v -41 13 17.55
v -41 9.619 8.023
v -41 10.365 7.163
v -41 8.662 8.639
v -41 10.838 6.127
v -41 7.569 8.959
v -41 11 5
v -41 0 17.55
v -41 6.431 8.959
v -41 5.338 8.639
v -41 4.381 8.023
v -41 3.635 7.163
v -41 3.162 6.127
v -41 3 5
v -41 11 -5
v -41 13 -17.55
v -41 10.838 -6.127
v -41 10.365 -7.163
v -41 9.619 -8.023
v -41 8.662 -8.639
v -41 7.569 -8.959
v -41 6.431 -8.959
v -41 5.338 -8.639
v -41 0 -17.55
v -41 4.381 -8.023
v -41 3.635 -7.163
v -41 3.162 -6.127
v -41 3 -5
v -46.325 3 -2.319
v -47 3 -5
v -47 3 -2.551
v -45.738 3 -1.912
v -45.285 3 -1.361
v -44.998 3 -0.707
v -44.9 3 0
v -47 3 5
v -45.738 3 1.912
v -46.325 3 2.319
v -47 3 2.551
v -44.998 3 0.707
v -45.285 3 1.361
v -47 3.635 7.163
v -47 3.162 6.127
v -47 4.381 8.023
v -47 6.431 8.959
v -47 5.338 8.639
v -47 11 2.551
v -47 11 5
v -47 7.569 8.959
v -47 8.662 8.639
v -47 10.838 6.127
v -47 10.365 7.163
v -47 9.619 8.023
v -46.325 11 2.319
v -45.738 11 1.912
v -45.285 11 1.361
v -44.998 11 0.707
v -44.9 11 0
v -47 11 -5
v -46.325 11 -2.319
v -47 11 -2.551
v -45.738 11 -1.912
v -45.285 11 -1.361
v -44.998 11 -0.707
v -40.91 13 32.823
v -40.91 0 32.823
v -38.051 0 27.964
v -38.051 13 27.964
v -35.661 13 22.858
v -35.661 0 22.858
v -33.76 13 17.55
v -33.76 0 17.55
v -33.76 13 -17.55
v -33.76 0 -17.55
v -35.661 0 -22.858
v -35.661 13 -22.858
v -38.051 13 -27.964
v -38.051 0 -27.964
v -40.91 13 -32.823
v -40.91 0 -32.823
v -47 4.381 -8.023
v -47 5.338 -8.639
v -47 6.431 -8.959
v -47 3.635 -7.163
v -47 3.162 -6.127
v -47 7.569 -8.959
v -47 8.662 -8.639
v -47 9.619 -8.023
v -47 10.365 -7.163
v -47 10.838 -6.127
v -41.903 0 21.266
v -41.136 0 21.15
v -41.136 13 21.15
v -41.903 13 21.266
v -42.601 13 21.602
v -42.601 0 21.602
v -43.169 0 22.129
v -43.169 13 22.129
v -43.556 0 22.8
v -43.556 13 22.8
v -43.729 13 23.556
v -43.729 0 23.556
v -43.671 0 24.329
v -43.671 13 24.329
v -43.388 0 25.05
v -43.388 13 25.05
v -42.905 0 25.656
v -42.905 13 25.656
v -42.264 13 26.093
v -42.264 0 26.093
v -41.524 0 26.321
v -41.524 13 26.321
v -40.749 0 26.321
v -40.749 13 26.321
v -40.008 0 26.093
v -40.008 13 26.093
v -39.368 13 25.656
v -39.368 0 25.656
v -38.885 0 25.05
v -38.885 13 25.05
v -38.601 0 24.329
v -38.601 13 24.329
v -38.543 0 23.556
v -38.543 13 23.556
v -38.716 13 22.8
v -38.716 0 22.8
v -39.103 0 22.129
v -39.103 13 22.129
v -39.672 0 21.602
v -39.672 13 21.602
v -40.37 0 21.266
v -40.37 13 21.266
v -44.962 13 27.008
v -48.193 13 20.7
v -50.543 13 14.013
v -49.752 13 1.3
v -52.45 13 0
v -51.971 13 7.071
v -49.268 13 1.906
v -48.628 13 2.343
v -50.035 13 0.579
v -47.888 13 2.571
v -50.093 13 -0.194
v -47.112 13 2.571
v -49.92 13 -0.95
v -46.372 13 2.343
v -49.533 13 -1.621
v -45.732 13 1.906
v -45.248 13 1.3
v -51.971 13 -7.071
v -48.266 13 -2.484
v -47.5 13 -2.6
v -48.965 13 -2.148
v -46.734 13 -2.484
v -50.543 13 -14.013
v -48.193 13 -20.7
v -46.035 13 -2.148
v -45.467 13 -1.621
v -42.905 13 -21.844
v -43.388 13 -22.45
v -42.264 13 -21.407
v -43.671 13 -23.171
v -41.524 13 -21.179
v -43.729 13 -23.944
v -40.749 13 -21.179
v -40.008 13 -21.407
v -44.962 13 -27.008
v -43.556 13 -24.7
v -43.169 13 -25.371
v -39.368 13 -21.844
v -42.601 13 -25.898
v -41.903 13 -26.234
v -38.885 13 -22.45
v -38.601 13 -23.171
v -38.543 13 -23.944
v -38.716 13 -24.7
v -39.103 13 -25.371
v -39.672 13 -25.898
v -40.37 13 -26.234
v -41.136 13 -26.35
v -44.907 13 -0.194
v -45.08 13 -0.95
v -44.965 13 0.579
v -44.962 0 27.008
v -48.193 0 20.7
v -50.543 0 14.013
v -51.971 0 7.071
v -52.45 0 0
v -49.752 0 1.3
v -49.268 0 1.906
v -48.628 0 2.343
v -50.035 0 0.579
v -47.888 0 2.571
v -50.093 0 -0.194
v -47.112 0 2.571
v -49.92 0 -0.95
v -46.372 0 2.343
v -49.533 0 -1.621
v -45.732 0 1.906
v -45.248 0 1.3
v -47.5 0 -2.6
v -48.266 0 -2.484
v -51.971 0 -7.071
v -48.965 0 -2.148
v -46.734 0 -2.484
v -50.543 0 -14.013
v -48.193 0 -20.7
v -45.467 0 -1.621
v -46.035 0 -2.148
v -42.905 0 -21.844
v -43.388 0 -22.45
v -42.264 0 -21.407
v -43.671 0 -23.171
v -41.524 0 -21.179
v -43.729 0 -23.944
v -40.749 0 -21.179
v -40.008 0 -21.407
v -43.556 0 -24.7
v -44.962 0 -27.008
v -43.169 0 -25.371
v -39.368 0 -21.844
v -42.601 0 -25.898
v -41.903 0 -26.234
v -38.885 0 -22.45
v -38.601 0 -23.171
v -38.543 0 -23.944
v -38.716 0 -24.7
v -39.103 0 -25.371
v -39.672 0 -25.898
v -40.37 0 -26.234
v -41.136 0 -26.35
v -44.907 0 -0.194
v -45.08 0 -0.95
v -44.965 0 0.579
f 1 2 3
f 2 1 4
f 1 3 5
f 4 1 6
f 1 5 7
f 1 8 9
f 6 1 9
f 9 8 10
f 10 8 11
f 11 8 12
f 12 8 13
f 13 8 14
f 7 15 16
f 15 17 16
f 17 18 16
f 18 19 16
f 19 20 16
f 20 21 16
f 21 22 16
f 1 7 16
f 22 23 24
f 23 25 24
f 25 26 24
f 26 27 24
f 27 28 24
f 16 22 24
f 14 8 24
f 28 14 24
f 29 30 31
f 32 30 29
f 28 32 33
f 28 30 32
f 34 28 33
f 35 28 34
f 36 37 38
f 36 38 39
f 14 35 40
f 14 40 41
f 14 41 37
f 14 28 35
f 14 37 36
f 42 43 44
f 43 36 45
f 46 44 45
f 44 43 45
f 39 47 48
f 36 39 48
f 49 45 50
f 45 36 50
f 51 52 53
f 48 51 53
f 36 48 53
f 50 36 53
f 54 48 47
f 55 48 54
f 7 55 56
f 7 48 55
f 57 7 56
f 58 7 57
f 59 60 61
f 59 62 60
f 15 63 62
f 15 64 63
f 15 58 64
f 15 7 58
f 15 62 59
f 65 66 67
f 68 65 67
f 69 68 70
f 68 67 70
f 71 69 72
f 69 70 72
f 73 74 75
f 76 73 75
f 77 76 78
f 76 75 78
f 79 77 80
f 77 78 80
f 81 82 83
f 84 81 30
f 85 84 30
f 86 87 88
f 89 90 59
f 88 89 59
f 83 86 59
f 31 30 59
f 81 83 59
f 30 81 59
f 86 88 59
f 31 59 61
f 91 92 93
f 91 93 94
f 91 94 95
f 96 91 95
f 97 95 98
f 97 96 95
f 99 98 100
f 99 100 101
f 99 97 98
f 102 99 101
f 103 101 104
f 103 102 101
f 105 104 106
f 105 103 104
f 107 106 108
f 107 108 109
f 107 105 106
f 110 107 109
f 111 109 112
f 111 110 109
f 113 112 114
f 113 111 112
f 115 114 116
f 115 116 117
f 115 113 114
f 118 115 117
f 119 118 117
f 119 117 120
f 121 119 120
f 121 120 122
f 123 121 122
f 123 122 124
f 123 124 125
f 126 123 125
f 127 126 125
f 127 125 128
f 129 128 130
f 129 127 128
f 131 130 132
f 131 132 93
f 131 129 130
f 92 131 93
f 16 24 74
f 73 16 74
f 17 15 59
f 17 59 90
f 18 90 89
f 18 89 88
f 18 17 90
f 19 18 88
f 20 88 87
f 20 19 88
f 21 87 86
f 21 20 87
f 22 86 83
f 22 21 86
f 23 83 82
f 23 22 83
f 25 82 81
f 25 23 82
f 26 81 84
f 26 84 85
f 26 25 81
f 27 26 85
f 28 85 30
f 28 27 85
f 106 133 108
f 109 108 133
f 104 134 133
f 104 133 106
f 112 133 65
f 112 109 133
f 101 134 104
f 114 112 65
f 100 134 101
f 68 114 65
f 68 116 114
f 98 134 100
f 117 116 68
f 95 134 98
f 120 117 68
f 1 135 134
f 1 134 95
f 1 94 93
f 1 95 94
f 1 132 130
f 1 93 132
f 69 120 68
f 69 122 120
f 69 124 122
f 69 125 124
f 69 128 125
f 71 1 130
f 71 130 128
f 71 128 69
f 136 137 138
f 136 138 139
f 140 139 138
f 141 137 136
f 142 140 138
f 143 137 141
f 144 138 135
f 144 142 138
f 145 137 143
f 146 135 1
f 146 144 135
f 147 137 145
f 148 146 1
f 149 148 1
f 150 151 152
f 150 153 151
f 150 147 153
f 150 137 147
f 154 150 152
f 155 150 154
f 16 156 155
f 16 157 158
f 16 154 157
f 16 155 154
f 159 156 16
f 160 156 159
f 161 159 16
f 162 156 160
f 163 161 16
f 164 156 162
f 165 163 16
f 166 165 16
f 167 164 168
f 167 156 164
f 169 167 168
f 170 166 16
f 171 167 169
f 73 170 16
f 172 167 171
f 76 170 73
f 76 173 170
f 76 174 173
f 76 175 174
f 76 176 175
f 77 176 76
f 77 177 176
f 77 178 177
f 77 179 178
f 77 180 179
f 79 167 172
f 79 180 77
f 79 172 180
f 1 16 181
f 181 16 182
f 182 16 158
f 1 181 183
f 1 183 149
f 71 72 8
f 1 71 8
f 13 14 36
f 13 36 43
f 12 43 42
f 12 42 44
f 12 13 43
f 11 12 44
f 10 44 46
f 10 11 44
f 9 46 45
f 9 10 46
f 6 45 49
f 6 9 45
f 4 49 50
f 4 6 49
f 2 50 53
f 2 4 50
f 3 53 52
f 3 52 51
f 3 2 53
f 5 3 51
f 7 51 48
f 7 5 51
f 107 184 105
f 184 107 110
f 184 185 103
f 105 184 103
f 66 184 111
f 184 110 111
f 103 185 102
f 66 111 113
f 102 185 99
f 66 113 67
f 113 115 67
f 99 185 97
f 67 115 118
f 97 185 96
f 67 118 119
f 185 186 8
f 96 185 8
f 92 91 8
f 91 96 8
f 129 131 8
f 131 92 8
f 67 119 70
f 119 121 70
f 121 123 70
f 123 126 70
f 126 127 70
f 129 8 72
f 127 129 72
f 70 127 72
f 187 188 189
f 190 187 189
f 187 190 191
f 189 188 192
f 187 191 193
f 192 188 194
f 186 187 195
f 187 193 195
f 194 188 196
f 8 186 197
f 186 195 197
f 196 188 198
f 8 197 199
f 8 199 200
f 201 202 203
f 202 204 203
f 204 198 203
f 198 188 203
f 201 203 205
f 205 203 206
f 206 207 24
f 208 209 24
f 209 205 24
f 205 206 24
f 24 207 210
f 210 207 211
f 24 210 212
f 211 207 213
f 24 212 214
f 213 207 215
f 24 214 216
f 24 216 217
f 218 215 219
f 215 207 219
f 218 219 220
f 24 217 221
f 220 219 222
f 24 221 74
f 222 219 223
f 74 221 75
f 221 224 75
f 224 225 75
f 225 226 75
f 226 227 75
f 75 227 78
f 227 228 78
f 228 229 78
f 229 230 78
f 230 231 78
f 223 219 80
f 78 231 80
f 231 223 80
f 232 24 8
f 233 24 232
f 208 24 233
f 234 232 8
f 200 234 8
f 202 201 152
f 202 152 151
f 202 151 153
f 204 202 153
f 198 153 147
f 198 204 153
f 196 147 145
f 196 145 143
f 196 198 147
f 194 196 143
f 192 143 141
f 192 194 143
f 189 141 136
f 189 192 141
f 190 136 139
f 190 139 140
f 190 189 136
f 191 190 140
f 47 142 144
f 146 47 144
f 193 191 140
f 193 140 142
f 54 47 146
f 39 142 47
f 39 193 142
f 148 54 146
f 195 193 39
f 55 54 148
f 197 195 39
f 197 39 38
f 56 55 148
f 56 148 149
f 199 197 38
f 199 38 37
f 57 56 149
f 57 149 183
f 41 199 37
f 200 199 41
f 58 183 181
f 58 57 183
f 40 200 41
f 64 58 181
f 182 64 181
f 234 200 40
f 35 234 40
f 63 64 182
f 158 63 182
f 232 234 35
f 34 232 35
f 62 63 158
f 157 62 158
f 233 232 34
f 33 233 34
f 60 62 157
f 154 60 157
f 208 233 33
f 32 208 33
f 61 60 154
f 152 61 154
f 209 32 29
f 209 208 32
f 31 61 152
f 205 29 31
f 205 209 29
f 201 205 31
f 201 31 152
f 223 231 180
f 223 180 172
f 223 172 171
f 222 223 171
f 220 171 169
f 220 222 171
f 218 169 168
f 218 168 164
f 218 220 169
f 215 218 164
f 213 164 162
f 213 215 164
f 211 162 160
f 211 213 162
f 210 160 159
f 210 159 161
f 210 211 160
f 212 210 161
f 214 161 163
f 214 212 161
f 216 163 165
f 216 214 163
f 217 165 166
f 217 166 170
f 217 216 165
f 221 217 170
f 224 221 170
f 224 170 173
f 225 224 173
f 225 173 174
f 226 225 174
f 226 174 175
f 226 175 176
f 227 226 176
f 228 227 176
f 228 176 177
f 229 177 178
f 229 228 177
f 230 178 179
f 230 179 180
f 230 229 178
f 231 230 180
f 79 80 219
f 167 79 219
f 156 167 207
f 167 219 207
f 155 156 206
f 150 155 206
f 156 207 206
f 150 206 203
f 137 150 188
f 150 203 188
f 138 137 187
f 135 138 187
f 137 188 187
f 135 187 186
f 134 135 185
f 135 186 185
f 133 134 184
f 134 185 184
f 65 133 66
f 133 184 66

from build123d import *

# Parameters (mm, degrees)
SKETCH_1_R          = 2.6
EXTRUDE_1_DEPTH     = 13
CUT_EXTRUDE_1_DEPTH = 6


with BuildPart() as part:
    # 草图1 → 凸台-拉伸1 (new body)
    with BuildSketch(Plane(origin=(0, 0, 0), x_dir=(1, 0, 0), z_dir=(0, 1, 0))):
        with BuildLine():
            Line((-33.760275315, -17.55), (-41, -17.55))
            Line((-41, -17.55), (-41, 17.55))
            Line((-41, 17.55), (-33.760275315, 17.55))
            ThreePointArc((-33.760275315, 17.55), (-36.796000438, 25.438985546), (-40.910253672, 32.823065739))
            ThreePointArc((-40.910253672, 32.823065739), (-52.45, 0), (-40.910253672, -32.823065739))
            ThreePointArc((-40.910253672, -32.823065739), (-36.796000438, -25.438985546), (-33.760275315, -17.55))
        make_face()
        with Locations(Location((-41.13620668, -23.75, 0), (0, 0, 90))):
            Circle(SKETCH_1_R, mode=Mode.SUBTRACT)
        with Locations(Location((-41.13620668, 23.75, 0), (0, 0, 90))):
            Circle(SKETCH_1_R, mode=Mode.SUBTRACT)
        with Locations(Location((-47.5, 0, 0), (0, 0, 90))):
            Circle(SKETCH_1_R, mode=Mode.SUBTRACT)
    extrude(amount=EXTRUDE_1_DEPTH)

    # 草图3 → 切除-拉伸1 (cut)
    with BuildSketch(Plane(origin=(-41, 0, 0), x_dir=(0, 0, -1), z_dir=(1, 0, 0))):
        with BuildLine():
            Line((-5, 11), (5, 11))
            ThreePointArc((5, 11), (9, 7), (5, 3))
            Line((5, 3), (-5, 3))
            ThreePointArc((-5, 3), (-9, 7), (-5, 11))
        make_face()
    extrude(amount=-CUT_EXTRUDE_1_DEPTH, mode=Mode.SUBTRACT)


solid = part.part
